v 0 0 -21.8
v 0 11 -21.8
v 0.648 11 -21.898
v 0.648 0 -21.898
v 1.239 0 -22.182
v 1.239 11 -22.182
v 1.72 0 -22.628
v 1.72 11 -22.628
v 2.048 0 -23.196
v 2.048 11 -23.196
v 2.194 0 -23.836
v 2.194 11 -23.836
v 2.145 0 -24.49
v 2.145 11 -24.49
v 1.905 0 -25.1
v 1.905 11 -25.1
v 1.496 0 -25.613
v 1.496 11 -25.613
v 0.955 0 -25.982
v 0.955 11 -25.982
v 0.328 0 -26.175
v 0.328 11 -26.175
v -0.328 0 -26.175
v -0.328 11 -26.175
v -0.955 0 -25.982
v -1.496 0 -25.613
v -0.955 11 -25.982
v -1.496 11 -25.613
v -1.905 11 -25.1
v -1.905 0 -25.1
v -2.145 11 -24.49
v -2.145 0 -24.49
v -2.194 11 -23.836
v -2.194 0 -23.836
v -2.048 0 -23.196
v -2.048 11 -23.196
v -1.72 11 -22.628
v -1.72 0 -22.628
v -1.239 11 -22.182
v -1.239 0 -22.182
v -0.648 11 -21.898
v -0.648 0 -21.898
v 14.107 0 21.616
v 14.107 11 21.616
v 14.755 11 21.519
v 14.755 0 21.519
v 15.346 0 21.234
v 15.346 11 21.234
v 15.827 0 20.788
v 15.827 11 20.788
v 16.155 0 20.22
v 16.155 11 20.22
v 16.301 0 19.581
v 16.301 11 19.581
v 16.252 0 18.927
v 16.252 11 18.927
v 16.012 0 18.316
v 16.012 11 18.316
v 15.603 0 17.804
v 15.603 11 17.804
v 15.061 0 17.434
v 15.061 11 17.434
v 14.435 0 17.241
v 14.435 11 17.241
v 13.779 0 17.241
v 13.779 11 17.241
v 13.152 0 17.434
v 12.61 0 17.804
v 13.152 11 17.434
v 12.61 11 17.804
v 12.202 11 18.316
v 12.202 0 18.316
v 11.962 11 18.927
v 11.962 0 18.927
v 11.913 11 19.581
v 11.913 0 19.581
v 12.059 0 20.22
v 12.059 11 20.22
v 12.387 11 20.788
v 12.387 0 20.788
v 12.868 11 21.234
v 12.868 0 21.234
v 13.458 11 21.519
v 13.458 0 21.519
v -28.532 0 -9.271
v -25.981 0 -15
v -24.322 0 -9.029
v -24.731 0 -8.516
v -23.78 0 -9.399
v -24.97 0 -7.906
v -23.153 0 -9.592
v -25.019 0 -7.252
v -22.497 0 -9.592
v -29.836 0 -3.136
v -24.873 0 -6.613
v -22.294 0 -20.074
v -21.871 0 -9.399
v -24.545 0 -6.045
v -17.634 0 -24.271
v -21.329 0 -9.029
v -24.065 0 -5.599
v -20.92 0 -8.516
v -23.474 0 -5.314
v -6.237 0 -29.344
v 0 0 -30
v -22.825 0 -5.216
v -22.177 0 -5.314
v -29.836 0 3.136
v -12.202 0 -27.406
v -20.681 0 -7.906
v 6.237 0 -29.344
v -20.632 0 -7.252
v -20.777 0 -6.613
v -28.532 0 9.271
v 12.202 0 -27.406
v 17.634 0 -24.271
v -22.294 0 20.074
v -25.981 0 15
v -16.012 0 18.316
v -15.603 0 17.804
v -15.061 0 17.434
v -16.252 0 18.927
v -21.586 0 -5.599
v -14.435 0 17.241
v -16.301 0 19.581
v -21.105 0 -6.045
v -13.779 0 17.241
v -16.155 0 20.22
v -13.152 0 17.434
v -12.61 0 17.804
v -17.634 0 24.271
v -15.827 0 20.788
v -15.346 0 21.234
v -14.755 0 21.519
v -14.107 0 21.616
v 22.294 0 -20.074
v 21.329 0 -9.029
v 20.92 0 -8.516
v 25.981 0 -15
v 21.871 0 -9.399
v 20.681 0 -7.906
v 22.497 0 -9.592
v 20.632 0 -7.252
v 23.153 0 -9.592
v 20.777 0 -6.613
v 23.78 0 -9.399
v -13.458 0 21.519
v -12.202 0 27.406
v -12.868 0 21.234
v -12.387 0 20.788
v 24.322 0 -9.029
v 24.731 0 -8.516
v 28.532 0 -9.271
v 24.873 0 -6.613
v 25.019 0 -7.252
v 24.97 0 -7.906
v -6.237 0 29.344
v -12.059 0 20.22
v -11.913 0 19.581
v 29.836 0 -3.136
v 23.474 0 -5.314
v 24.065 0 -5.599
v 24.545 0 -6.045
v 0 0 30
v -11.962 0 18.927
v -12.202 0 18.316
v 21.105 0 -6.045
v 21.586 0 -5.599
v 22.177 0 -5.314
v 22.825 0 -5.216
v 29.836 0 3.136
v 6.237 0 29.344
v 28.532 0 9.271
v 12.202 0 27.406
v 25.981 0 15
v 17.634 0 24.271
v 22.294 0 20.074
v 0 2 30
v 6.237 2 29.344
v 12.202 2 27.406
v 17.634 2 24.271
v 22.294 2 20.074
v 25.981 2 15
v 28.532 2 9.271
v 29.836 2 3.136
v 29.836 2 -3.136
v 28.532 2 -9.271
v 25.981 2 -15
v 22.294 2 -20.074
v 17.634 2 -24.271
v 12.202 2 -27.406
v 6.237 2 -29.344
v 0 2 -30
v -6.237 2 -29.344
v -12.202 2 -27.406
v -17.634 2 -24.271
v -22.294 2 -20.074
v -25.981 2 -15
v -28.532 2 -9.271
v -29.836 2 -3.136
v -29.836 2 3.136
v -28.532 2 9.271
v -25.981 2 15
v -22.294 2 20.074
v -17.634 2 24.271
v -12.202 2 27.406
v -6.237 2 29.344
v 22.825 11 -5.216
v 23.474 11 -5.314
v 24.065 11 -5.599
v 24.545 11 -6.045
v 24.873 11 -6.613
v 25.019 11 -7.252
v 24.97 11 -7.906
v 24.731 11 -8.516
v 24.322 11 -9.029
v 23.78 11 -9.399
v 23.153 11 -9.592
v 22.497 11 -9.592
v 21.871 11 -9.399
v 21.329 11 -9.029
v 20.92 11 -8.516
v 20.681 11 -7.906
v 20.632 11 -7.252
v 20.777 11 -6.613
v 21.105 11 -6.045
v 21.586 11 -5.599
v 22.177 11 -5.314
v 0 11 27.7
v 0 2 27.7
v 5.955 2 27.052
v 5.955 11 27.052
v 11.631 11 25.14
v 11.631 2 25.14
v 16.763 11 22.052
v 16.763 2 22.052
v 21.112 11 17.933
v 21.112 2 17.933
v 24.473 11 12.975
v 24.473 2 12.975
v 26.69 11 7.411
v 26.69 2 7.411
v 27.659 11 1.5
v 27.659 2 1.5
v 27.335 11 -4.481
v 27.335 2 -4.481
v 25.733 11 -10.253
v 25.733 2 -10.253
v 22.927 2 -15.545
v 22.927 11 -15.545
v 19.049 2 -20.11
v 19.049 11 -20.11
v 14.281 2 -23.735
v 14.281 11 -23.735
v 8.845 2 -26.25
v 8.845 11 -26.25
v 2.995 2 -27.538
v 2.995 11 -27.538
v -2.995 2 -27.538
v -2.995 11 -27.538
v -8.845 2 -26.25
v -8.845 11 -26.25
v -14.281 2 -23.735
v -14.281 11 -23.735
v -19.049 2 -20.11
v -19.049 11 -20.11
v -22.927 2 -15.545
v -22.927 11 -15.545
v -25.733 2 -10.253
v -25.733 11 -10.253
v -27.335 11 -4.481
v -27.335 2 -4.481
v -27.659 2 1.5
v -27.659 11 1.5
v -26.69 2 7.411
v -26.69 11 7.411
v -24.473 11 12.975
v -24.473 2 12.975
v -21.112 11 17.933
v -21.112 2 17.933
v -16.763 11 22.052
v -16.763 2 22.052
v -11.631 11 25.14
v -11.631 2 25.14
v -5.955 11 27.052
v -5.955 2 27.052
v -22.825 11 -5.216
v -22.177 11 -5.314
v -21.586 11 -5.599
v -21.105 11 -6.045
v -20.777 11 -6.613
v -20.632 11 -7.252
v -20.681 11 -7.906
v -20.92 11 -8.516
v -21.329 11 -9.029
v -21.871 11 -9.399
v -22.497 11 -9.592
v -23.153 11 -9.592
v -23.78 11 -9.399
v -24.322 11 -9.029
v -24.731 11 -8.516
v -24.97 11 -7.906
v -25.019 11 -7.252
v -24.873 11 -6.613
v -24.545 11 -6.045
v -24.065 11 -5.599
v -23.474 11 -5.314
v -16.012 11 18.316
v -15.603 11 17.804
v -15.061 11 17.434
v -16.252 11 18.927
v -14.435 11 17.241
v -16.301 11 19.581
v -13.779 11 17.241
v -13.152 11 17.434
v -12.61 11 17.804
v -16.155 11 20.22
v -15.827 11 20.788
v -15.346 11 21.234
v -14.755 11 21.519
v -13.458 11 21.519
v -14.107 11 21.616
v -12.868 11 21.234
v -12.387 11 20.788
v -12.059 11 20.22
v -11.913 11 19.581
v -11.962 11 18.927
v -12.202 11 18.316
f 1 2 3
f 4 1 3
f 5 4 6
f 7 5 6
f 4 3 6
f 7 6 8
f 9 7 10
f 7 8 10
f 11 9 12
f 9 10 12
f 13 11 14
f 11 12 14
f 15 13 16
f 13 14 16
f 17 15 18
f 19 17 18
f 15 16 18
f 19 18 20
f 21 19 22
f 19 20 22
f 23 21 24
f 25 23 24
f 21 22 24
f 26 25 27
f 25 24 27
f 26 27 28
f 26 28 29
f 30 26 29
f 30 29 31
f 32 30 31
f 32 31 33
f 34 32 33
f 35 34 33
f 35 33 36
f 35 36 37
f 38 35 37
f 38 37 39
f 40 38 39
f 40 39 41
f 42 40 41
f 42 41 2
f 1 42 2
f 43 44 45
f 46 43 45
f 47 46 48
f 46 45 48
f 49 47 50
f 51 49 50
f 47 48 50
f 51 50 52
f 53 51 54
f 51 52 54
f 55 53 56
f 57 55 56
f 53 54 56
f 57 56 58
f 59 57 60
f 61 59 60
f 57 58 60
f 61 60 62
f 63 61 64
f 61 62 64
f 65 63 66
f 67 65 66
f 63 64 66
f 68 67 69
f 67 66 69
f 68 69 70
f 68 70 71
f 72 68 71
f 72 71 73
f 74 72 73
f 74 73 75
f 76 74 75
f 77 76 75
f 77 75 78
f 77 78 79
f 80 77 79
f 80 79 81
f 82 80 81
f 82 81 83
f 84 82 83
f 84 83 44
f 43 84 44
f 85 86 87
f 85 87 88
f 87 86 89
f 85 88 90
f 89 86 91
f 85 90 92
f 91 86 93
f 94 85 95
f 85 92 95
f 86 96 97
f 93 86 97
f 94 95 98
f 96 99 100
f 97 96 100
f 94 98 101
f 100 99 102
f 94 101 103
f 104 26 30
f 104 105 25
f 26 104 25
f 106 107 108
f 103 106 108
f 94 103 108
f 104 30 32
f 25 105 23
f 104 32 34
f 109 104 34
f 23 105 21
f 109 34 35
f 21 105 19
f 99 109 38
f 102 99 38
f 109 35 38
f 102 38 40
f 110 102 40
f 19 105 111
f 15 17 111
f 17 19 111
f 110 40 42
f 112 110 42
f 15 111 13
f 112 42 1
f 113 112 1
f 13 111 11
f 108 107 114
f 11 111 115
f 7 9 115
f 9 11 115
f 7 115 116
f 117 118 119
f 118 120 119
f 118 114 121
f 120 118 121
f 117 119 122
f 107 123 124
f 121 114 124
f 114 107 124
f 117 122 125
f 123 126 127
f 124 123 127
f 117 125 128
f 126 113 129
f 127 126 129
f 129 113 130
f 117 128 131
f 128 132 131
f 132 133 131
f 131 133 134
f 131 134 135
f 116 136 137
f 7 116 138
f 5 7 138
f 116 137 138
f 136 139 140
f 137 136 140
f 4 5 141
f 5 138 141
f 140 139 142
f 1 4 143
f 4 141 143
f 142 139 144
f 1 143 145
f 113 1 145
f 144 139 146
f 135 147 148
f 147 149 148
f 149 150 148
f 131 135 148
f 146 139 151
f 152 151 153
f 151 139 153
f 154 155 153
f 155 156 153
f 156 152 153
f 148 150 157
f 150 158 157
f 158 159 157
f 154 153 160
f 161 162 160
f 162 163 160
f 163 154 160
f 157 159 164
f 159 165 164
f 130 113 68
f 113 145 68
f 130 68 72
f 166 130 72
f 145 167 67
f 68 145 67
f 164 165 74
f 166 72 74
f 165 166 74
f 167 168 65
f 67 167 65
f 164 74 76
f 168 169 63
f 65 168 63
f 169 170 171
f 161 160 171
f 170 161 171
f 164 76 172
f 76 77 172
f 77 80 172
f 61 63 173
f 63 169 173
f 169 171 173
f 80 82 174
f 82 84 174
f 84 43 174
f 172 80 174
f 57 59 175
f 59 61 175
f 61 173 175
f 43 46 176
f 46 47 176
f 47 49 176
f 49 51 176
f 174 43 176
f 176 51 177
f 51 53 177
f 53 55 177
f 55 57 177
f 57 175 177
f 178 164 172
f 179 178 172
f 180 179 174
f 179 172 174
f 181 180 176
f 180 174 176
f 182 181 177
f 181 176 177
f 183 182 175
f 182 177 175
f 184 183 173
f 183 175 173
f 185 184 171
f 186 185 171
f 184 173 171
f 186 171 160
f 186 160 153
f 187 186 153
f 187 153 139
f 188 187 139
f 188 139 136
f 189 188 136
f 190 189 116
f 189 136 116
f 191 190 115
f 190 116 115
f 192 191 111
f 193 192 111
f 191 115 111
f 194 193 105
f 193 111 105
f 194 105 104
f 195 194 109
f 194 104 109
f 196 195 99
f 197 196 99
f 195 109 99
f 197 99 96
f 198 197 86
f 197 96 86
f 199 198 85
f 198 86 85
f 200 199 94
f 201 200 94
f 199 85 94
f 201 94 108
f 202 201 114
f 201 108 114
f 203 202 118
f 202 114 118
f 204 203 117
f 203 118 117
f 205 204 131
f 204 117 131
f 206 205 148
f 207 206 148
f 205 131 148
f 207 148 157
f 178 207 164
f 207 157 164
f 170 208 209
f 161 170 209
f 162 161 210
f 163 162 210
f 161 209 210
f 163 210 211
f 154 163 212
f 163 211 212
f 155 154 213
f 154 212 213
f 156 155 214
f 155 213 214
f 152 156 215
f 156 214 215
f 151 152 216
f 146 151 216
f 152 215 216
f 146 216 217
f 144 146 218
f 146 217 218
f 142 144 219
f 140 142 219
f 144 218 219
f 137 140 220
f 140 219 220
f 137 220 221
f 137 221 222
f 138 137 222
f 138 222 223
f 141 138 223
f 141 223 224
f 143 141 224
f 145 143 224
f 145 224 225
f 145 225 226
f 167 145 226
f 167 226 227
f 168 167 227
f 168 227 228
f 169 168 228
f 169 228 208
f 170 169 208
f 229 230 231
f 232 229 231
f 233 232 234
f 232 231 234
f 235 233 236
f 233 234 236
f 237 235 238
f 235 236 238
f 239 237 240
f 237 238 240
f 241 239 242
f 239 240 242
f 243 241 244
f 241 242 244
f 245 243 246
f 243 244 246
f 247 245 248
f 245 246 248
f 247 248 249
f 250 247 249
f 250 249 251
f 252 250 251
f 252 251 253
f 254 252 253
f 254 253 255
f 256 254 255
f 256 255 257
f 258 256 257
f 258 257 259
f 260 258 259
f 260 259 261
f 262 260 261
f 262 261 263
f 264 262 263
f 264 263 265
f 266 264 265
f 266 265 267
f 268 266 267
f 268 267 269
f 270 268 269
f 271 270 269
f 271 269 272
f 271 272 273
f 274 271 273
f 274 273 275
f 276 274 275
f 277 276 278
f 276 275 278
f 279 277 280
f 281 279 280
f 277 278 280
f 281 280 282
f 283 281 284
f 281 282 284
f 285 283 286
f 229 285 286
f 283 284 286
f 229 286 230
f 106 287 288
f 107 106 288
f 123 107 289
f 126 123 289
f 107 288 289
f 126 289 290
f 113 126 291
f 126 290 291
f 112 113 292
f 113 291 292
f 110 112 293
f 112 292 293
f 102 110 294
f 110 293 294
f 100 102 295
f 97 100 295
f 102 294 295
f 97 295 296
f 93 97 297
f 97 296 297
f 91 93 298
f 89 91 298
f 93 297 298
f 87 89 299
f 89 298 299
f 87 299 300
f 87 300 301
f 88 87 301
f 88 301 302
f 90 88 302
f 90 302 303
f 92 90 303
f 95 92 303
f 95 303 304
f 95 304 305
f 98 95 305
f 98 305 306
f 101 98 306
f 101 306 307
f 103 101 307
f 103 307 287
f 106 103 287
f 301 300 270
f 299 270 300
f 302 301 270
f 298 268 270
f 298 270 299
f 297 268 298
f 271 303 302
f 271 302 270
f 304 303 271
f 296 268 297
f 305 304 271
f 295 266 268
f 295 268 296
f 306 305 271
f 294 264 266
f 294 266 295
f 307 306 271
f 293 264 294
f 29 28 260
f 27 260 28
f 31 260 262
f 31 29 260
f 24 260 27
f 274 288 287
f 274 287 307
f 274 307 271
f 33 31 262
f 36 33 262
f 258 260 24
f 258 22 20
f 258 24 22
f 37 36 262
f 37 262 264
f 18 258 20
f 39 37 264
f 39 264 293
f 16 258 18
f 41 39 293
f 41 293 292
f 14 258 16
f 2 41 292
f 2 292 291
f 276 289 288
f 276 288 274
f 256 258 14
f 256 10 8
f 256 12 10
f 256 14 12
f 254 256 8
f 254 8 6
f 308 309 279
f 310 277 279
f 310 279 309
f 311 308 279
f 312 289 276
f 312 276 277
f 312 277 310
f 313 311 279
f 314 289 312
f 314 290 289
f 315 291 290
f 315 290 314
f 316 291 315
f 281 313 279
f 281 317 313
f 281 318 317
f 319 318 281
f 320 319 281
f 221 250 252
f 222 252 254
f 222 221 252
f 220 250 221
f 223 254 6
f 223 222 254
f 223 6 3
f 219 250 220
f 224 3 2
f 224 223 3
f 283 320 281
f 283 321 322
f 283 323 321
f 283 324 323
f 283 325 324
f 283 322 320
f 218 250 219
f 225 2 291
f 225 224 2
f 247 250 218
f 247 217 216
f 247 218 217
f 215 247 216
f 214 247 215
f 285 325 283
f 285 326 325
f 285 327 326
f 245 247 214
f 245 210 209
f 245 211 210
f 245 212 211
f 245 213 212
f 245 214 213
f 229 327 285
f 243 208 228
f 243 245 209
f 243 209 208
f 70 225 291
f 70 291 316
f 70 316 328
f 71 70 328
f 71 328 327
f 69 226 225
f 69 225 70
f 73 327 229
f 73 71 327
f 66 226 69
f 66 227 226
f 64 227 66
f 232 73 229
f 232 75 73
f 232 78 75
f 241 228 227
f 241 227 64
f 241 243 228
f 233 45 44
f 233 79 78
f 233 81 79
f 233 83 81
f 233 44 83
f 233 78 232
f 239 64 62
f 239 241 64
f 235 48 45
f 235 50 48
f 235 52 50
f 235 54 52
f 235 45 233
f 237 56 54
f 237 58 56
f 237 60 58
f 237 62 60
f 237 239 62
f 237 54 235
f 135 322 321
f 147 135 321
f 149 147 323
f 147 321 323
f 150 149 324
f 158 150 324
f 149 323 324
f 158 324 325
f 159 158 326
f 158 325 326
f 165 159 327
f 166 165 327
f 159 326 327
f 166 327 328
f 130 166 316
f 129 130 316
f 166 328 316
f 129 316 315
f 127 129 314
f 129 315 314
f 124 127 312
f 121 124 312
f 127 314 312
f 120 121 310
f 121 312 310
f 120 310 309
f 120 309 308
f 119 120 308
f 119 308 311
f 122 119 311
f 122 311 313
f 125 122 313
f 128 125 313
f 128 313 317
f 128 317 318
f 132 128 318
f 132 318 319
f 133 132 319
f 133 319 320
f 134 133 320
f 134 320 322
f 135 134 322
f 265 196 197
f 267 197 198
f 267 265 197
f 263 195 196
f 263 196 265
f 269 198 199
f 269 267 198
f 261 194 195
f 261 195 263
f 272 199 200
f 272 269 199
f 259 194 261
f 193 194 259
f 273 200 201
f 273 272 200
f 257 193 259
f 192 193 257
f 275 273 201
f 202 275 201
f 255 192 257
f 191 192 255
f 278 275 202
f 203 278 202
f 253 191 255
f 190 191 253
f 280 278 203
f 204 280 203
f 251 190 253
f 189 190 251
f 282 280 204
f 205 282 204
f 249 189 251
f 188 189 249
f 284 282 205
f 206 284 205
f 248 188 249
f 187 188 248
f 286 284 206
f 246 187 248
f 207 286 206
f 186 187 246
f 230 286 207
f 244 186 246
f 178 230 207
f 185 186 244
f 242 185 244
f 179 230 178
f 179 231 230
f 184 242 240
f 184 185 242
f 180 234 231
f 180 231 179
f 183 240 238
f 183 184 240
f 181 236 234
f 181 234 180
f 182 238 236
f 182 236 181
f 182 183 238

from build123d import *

# Parameters (mm, degrees)
SKETCH3_R           = 27.7
BOSS_EXTRUDE2_DEPTH = 11
SKETCH4_R           = 30
BOSS_EXTRUDE3_DEPTH = 2
SKETCH5_R           = 2.2
CUT_EXTRUDE1_DEPTH  = 44.829214002


with BuildPart() as part:
    # Sketch3 → Boss-Extrude2 (new body)
    with BuildSketch(Plane(origin=(0, 0, 0), x_dir=(1, 0, 0), z_dir=(0, 1, 0))):
        with Locations(Location((0, 0, 0), (0, 0, 270))):
            Circle(SKETCH3_R)
    extrude(amount=BOSS_EXTRUDE2_DEPTH)

    # Sketch4 → Boss-Extrude3 (add)
    with BuildSketch(Plane(origin=(0, 0, 0), x_dir=(1, 0, 0), z_dir=(0, 1, 0))):
        with Locations(Location((0, 0, 0), (0, 0, 270))):
            Circle(SKETCH4_R)
    extrude(amount=BOSS_EXTRUDE3_DEPTH)

    # Sketch5 → Cut-Extrude1 (cut, through all)
    with BuildSketch(Plane(origin=(0, 11, 0), x_dir=(1, 0, 0), z_dir=(0, 1, 0))):
        with Locations(Location((0, 24, 0), (0, 0, 270))):
            Circle(SKETCH5_R)
        with Locations(Location((22.825356391, 7.416407865, 0), (0, 0, 270))):
            Circle(SKETCH5_R)
        with Locations(Location((14.106846055, -19.416407865, 0), (0, 0, 270))):
            Circle(SKETCH5_R)
        with Locations(Location((-14.106846055, -19.416407865, 0), (0, 0, 270))):
            Circle(SKETCH5_R)
        with Locations(Location((-22.825356391, 7.416407865, 0), (0, 0, 270))):
            Circle(SKETCH5_R)
    extrude(amount=-CUT_EXTRUDE1_DEPTH, mode=Mode.SUBTRACT)


solid = part.part
